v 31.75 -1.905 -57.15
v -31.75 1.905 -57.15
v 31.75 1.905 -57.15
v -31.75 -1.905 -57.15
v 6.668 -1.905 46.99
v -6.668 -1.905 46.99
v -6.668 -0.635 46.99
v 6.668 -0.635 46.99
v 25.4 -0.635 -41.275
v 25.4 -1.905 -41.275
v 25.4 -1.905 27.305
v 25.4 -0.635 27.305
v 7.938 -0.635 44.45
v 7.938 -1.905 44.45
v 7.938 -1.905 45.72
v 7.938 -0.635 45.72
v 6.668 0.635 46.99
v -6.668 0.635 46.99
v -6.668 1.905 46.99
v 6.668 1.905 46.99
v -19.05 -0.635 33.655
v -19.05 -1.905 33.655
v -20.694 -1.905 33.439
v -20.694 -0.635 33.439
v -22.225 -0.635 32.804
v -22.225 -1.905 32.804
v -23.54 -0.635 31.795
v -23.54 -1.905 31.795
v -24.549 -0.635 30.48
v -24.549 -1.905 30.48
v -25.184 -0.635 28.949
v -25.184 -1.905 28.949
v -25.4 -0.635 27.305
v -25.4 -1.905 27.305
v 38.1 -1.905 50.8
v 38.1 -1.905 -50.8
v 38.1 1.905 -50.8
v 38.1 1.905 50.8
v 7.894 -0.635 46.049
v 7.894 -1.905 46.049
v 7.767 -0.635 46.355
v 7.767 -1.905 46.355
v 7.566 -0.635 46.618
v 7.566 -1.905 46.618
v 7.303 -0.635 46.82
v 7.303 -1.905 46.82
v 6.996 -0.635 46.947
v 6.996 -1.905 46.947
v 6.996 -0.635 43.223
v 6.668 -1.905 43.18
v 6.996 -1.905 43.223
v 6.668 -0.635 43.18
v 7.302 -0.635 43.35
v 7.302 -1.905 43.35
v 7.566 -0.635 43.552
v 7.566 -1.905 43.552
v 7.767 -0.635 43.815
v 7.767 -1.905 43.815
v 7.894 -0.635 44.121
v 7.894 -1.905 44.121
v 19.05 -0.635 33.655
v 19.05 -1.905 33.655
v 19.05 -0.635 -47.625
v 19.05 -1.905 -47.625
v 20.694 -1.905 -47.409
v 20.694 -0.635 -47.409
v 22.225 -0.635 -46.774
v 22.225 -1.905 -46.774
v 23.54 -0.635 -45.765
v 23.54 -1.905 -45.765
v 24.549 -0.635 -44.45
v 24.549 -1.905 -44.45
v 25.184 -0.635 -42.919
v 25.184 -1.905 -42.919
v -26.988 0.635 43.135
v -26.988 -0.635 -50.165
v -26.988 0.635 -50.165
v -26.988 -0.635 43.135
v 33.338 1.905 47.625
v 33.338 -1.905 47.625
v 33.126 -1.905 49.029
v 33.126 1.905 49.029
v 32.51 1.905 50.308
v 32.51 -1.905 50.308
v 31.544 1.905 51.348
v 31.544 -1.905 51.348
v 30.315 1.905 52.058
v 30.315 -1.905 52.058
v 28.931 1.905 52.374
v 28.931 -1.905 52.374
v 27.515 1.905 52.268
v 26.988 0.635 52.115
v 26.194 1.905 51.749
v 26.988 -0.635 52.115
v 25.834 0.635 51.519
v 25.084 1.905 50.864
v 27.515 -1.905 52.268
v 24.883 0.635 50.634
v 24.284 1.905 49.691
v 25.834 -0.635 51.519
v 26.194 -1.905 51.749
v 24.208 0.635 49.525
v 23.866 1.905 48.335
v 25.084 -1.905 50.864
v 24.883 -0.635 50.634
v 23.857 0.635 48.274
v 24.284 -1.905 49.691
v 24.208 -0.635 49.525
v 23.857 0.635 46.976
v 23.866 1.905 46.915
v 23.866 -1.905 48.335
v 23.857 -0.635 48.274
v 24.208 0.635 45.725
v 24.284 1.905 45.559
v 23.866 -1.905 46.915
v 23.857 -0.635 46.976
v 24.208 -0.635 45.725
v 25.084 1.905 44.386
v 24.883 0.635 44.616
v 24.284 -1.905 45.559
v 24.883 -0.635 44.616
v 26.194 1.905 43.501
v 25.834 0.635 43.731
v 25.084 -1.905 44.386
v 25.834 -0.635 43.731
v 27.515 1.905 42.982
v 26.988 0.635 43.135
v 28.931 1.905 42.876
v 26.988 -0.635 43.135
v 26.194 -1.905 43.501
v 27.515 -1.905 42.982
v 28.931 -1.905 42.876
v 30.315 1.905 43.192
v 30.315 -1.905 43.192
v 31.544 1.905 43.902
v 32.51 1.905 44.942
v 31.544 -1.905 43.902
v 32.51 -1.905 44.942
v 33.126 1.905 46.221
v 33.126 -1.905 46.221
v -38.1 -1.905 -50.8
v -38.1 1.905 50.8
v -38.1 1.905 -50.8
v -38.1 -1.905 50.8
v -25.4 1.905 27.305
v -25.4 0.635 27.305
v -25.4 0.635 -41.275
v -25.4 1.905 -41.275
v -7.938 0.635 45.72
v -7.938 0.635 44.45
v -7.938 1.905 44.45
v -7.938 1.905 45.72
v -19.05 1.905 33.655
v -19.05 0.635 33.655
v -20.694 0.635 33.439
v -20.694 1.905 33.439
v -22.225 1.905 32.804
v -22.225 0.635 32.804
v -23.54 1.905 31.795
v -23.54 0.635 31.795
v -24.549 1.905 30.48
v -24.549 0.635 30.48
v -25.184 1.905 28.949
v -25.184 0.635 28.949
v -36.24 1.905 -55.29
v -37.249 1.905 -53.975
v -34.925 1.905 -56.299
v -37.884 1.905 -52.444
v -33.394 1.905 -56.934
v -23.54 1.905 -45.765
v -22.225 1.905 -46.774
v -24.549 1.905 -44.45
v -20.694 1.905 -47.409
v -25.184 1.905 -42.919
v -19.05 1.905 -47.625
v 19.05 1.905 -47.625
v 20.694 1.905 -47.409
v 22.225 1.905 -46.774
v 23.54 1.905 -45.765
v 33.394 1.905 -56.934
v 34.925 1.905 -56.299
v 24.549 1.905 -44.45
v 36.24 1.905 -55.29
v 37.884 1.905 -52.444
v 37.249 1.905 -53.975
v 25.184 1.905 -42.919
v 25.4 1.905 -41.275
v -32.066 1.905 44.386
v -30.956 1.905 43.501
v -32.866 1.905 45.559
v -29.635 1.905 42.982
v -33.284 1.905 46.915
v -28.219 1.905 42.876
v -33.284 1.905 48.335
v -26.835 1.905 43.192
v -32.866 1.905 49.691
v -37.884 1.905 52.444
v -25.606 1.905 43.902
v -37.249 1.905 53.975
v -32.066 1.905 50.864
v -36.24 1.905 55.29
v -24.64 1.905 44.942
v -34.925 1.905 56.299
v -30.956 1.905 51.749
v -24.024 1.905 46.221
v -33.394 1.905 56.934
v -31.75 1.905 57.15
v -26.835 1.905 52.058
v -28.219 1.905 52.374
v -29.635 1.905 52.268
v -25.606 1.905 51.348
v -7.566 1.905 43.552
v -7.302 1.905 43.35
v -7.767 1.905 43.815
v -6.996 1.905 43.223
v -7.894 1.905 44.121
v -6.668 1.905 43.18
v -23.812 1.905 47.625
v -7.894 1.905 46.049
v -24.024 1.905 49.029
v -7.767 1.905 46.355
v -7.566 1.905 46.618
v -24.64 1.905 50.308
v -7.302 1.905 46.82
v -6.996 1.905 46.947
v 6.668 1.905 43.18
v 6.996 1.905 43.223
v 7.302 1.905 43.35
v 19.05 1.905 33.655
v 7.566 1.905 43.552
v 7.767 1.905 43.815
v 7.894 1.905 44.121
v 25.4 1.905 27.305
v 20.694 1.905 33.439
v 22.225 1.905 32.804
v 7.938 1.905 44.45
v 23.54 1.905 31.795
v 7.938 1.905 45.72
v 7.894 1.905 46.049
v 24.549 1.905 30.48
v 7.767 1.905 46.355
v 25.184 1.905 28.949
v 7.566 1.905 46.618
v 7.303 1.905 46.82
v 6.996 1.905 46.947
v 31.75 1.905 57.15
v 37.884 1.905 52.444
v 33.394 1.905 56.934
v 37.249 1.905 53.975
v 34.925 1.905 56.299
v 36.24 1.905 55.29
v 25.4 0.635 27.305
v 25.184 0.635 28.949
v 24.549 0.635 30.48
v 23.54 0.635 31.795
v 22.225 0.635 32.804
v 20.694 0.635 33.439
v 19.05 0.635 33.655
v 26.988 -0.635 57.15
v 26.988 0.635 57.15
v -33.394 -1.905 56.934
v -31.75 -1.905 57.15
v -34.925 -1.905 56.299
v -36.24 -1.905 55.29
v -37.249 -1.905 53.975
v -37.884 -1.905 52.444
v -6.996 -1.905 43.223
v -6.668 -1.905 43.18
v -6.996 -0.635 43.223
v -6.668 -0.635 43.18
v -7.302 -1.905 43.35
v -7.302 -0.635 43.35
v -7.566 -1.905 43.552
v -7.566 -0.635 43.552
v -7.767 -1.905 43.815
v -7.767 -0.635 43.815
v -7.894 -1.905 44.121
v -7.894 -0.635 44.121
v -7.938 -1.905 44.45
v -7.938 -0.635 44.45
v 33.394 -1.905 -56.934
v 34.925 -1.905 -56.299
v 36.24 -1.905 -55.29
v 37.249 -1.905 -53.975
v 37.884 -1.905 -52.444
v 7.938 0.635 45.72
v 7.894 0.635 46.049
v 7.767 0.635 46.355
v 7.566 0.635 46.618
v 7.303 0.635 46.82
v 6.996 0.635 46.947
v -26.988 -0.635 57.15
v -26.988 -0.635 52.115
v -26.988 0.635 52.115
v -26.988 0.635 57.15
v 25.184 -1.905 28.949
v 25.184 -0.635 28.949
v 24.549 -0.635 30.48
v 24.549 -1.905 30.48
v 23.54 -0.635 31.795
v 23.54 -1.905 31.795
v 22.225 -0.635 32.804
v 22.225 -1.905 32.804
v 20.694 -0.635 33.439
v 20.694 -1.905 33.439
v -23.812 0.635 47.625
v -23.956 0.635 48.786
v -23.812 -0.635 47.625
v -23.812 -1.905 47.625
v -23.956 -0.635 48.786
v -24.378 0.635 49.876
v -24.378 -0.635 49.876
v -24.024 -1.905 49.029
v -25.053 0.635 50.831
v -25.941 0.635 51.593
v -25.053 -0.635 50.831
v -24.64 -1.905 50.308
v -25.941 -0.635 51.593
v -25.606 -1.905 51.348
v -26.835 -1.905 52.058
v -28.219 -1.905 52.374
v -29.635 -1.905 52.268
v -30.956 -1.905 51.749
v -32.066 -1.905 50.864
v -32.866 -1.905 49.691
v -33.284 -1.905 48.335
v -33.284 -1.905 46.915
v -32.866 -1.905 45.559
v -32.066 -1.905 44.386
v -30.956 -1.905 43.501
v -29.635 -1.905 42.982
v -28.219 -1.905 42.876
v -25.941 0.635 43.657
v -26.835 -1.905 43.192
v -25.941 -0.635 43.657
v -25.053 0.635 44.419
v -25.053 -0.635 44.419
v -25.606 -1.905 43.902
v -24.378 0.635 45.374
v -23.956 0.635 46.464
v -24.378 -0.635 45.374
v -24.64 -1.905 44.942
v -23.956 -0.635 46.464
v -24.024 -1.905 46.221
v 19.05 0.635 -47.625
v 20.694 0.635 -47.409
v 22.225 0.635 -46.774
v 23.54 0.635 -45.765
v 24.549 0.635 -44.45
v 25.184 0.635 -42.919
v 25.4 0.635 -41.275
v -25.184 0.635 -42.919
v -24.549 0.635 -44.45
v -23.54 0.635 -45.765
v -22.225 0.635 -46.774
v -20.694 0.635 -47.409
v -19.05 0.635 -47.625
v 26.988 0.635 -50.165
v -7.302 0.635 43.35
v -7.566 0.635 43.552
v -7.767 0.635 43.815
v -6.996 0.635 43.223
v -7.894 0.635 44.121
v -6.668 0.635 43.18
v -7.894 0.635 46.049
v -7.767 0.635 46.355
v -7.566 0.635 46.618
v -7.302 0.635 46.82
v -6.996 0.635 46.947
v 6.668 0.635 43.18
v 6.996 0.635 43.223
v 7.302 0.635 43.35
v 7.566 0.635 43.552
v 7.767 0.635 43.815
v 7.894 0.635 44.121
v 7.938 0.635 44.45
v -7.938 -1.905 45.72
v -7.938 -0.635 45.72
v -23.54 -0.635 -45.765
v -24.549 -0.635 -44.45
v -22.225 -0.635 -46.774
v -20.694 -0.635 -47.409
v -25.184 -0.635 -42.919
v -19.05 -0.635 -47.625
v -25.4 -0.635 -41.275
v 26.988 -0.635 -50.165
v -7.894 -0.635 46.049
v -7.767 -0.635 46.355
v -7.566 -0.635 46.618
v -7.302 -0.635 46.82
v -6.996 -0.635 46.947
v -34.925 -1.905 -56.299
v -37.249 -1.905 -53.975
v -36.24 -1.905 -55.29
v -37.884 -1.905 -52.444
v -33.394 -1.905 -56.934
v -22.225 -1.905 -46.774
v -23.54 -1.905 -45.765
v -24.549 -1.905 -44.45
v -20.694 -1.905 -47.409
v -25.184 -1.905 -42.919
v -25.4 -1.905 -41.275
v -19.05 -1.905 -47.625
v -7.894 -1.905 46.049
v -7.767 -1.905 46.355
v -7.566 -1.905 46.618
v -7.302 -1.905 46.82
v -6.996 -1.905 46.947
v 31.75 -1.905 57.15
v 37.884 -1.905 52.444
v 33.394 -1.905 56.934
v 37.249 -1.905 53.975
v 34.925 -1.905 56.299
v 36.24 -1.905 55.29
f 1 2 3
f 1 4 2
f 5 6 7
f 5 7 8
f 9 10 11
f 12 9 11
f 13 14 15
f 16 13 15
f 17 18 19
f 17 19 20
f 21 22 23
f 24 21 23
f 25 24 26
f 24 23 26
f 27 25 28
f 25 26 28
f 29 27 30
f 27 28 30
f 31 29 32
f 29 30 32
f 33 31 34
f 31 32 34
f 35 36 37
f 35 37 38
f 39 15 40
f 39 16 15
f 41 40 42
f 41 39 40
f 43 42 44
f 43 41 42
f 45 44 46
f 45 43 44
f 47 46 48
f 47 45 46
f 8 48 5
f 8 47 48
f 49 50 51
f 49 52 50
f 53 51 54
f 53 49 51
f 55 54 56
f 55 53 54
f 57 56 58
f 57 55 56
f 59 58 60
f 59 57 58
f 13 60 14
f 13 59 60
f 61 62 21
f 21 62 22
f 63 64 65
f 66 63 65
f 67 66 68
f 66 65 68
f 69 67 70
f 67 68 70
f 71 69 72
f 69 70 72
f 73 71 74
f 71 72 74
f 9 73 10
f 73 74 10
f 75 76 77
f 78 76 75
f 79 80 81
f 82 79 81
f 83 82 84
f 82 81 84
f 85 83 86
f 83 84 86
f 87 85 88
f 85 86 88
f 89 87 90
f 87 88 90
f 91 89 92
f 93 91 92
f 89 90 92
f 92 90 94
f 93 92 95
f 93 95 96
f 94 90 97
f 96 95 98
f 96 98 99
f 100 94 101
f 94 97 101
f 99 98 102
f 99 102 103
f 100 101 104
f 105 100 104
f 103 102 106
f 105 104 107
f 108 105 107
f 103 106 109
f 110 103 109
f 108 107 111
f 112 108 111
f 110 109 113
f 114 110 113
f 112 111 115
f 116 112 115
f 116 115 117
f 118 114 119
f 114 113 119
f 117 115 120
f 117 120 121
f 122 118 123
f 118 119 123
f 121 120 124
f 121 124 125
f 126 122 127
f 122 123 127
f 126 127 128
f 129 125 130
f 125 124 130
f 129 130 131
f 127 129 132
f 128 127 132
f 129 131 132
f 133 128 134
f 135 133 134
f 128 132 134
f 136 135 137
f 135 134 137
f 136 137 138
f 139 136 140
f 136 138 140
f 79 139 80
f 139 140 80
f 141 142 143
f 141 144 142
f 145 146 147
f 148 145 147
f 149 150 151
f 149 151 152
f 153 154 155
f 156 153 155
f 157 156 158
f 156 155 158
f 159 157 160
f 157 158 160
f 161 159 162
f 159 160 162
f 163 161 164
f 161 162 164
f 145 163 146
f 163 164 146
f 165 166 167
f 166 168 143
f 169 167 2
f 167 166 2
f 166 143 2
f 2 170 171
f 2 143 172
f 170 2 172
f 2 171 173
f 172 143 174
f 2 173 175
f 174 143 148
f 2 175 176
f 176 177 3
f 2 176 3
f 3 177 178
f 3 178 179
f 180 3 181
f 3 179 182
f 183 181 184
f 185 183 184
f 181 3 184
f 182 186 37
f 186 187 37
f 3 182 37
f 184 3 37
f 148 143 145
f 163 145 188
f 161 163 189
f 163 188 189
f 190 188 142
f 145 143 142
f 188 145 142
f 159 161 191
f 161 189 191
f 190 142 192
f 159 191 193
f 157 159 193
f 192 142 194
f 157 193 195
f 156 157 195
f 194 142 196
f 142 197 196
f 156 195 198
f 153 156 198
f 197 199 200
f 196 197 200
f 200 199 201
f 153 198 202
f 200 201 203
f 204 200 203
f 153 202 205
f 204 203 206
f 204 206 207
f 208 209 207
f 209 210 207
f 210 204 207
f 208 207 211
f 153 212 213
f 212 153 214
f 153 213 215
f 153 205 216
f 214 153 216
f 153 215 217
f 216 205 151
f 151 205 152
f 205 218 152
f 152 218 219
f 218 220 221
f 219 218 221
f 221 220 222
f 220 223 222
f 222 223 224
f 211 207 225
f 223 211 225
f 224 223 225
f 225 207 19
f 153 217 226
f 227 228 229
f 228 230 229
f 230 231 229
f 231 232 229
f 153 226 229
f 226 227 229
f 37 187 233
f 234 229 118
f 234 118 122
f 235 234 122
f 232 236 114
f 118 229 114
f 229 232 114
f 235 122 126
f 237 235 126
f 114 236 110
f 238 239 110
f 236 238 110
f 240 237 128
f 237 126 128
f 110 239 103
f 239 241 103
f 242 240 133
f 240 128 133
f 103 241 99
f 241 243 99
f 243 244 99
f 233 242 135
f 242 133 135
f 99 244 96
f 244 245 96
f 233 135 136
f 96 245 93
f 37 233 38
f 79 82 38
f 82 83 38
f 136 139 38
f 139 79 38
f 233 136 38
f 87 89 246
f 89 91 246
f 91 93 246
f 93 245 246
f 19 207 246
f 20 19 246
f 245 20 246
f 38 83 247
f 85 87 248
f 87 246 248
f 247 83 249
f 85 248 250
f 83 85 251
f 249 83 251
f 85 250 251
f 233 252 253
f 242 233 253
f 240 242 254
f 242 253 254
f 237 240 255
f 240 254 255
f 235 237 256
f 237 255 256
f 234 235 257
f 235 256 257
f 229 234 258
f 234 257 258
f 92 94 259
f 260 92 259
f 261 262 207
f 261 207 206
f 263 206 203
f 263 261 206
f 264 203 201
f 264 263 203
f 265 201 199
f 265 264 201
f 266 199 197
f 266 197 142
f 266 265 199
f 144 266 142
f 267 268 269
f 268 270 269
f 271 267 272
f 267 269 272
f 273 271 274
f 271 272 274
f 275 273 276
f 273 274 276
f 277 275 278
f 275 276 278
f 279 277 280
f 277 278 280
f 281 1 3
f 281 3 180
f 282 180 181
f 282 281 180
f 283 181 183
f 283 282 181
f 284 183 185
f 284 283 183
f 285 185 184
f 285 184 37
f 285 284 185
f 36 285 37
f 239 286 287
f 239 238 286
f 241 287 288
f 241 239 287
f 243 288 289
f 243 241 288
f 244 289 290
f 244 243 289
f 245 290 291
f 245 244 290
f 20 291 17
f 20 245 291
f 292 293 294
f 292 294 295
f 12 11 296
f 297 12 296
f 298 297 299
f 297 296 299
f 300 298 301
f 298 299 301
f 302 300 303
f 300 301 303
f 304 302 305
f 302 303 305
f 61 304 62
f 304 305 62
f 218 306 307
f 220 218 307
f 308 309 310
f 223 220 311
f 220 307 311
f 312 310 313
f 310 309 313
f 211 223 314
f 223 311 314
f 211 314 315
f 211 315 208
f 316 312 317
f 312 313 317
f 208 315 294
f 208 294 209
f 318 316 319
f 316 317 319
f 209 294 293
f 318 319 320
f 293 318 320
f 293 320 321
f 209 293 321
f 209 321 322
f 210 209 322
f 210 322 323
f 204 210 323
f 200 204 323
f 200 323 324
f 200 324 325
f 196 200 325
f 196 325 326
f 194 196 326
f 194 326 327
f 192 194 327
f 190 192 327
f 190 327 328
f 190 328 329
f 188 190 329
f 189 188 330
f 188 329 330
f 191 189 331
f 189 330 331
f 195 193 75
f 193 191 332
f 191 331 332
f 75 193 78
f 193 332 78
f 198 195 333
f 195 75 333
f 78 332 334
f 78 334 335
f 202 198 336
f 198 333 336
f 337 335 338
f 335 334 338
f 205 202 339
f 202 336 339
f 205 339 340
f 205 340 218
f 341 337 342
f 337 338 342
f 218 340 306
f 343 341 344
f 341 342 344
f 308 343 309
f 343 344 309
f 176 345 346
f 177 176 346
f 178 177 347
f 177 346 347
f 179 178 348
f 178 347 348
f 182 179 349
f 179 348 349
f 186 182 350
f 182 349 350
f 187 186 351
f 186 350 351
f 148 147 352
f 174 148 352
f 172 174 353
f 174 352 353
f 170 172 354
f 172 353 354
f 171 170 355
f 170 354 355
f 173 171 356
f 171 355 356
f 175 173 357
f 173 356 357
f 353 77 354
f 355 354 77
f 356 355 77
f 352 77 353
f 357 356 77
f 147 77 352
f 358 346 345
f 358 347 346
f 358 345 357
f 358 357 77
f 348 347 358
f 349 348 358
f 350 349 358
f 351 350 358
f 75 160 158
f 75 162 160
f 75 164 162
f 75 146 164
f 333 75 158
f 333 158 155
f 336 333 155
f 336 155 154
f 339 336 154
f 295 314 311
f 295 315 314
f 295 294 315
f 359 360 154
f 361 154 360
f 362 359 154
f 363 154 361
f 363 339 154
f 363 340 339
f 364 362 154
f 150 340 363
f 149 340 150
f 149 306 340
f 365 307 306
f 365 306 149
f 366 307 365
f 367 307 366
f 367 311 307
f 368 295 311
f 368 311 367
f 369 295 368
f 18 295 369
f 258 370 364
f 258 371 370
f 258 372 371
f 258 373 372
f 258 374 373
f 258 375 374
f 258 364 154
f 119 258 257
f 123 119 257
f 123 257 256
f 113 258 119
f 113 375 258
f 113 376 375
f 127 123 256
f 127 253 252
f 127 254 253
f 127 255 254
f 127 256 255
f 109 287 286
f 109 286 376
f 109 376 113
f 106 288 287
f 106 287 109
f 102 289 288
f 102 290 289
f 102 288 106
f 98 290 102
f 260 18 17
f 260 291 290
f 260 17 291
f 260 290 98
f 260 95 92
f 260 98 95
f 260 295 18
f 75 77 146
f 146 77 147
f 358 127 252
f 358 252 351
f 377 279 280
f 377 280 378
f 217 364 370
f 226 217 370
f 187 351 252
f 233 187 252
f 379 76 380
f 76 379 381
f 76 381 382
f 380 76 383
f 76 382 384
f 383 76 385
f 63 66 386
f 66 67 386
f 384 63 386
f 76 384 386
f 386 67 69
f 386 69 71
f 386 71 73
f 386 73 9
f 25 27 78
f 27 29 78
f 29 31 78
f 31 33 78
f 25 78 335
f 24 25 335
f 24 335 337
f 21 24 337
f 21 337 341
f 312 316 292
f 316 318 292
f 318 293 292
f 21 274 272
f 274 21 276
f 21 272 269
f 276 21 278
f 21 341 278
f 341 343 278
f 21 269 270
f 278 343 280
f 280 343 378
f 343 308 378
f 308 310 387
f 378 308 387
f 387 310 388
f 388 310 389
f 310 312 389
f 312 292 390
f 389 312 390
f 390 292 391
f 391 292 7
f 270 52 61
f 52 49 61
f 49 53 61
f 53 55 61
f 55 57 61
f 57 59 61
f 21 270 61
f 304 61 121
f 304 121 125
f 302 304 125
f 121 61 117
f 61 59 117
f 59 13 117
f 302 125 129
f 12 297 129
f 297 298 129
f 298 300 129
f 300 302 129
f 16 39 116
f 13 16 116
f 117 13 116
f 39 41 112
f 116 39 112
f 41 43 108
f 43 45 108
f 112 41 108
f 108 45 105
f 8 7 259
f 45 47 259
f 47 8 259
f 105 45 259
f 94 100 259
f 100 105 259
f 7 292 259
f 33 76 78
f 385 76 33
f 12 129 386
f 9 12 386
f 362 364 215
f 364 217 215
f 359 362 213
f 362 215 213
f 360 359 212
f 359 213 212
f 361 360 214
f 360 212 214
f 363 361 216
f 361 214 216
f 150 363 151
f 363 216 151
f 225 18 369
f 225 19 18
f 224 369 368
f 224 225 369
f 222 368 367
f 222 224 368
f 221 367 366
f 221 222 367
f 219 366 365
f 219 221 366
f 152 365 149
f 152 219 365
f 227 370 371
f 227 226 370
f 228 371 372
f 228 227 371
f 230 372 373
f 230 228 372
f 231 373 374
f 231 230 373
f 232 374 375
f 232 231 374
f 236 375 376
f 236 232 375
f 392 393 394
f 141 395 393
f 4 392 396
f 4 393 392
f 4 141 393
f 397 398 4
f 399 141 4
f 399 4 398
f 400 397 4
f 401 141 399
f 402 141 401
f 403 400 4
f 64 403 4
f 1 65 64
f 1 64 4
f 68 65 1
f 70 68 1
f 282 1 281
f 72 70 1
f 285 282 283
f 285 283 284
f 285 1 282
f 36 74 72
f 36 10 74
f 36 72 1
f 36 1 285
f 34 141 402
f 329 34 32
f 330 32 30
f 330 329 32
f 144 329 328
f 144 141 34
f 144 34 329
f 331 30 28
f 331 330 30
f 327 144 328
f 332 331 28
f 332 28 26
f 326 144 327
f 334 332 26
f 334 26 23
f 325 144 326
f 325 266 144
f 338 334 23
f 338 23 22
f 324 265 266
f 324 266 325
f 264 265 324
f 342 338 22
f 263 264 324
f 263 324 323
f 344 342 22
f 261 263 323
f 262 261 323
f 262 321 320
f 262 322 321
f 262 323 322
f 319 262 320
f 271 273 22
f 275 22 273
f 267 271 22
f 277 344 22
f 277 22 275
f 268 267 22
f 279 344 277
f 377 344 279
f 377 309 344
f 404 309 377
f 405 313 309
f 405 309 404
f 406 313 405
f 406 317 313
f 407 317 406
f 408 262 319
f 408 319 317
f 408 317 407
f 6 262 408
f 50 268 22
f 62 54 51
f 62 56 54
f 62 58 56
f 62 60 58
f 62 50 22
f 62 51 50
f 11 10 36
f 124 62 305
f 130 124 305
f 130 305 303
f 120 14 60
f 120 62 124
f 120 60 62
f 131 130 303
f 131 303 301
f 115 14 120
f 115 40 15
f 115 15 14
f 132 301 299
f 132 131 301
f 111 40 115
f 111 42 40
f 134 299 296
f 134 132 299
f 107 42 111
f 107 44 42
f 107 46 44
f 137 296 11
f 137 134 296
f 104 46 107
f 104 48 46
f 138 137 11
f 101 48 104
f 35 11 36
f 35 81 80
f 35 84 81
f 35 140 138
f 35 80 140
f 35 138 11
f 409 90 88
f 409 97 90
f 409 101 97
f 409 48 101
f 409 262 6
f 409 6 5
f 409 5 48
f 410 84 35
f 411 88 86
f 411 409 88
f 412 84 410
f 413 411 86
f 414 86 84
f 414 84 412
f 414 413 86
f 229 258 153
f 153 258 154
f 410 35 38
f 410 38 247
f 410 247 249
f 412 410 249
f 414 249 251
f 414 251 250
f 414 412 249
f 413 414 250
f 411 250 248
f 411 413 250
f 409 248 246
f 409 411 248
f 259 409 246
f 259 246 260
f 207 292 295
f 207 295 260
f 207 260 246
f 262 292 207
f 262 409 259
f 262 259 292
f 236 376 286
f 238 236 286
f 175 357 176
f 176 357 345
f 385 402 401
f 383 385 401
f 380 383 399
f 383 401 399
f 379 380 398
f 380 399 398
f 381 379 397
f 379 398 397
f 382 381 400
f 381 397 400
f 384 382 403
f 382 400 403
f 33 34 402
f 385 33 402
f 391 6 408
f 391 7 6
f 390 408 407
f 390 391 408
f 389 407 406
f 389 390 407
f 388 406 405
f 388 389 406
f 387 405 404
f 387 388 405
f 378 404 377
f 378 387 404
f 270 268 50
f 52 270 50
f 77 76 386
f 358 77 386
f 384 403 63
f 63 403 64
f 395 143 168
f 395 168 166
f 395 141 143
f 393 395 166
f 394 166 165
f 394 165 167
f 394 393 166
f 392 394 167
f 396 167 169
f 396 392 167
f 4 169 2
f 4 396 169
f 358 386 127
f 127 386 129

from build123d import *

# Parameters (mm, degrees)
F1_DEPTH  = 1.905
F3_DEPTH  = 3.811
F4_W      = 53.975
F4_H      = 107.315
F5_DEPTH  = 0.635
F6_W      = 15.875
F6_H      = 3.81
F7_DEPTH  = 3.811
F8_R      = 1.27
F9_R      = 4.7625
F10_DEPTH = 3.811


with BuildPart() as f1:
    # F0 (on Front) → F1 (new body, symmetric)
    with BuildSketch(Plane.XZ):
        with BuildLine():
            Line((-31.75, -57.15), (31.75, -57.15))
            ThreePointArc((31.75, -57.15), (36.240128, -55.290128), (38.1, -50.8))
            Line((38.1, -50.8), (38.1, 50.8))
            ThreePointArc((38.1, 50.8), (36.240128, 55.290128), (31.75, 57.15))
            Line((31.75, 57.15), (-31.75, 57.15))
            ThreePointArc((-31.75, 57.15), (-36.240128, 55.290128), (-38.1, 50.8))
            Line((-38.1, 50.8), (-38.1, -50.8))
            ThreePointArc((-38.1, -50.8), (-36.240128, -55.290128), (-31.75, -57.15))
        make_face()
    extrude(amount=F1_DEPTH, both=True)

    # F2 (on face) → F3 (cut, through all)
    with BuildSketch(Plane.XZ.offset(1.905)):
        with BuildLine():
            Line((19.05, 33.655), (-19.05, 33.655))
            ThreePointArc((-19.05, 33.655), (-23.540128, 31.795128), (-25.4, 27.305))
            Line((-25.4, 27.305), (-25.4, -41.275))
            ThreePointArc((-25.4, -41.275), (-23.540128, -45.765128), (-19.05, -47.625))
            Line((-19.05, -47.625), (19.05, -47.625))
            ThreePointArc((19.05, -47.625), (23.540128, -45.765128), (25.4, -41.275))
            Line((25.4, -41.275), (25.4, 27.305))
            ThreePointArc((25.4, 27.305), (23.540128, 31.795128), (19.05, 33.655))
        make_face()
    extrude(amount=-F3_DEPTH, mode=Mode.SUBTRACT)

    # F4 (on Front) → F5 (cut, symmetric)
    with BuildSketch(Plane.XZ):
        with Locations((0, 3.4925)):
            Rectangle(F4_W, F4_H)
    extrude(amount=F5_DEPTH, both=True, mode=Mode.SUBTRACT)

    # F6 (on face) → F7 (cut, through all)
    with BuildSketch(Plane.XZ.offset(1.905)):
        with Locations((0, 45.085)):
            Rectangle(F6_W, F6_H)
    extrude(amount=-F7_DEPTH, mode=Mode.SUBTRACT)

    # F8
    f8_edges = [f1.edges().sort_by_distance(p)[0] for p in [
        (-7.9375, 1.27, 46.99),
        (-7.9375, -1.27, 46.99),
        (7.9375, 1.27, 46.99),
        (7.9375, -1.27, 46.99),
        (7.9375, 1.27, 43.18),
        (7.9375, -1.27, 43.18),
        (-7.9375, 1.27, 43.18),
        (-7.9375, -1.27, 43.18),
    ]]
    fillet(f8_edges, radius=F8_R)

    # F9 (on face) → F10 (cut, through all)
    with BuildSketch(Plane.XZ.offset(1.905)):
        with Locations((-28.575, 47.625)):
            Circle(F9_R)
        with Locations((28.575, 47.625)):
            Circle(F9_R)
    extrude(amount=-F10_DEPTH, mode=Mode.SUBTRACT)


solid = f1.part
